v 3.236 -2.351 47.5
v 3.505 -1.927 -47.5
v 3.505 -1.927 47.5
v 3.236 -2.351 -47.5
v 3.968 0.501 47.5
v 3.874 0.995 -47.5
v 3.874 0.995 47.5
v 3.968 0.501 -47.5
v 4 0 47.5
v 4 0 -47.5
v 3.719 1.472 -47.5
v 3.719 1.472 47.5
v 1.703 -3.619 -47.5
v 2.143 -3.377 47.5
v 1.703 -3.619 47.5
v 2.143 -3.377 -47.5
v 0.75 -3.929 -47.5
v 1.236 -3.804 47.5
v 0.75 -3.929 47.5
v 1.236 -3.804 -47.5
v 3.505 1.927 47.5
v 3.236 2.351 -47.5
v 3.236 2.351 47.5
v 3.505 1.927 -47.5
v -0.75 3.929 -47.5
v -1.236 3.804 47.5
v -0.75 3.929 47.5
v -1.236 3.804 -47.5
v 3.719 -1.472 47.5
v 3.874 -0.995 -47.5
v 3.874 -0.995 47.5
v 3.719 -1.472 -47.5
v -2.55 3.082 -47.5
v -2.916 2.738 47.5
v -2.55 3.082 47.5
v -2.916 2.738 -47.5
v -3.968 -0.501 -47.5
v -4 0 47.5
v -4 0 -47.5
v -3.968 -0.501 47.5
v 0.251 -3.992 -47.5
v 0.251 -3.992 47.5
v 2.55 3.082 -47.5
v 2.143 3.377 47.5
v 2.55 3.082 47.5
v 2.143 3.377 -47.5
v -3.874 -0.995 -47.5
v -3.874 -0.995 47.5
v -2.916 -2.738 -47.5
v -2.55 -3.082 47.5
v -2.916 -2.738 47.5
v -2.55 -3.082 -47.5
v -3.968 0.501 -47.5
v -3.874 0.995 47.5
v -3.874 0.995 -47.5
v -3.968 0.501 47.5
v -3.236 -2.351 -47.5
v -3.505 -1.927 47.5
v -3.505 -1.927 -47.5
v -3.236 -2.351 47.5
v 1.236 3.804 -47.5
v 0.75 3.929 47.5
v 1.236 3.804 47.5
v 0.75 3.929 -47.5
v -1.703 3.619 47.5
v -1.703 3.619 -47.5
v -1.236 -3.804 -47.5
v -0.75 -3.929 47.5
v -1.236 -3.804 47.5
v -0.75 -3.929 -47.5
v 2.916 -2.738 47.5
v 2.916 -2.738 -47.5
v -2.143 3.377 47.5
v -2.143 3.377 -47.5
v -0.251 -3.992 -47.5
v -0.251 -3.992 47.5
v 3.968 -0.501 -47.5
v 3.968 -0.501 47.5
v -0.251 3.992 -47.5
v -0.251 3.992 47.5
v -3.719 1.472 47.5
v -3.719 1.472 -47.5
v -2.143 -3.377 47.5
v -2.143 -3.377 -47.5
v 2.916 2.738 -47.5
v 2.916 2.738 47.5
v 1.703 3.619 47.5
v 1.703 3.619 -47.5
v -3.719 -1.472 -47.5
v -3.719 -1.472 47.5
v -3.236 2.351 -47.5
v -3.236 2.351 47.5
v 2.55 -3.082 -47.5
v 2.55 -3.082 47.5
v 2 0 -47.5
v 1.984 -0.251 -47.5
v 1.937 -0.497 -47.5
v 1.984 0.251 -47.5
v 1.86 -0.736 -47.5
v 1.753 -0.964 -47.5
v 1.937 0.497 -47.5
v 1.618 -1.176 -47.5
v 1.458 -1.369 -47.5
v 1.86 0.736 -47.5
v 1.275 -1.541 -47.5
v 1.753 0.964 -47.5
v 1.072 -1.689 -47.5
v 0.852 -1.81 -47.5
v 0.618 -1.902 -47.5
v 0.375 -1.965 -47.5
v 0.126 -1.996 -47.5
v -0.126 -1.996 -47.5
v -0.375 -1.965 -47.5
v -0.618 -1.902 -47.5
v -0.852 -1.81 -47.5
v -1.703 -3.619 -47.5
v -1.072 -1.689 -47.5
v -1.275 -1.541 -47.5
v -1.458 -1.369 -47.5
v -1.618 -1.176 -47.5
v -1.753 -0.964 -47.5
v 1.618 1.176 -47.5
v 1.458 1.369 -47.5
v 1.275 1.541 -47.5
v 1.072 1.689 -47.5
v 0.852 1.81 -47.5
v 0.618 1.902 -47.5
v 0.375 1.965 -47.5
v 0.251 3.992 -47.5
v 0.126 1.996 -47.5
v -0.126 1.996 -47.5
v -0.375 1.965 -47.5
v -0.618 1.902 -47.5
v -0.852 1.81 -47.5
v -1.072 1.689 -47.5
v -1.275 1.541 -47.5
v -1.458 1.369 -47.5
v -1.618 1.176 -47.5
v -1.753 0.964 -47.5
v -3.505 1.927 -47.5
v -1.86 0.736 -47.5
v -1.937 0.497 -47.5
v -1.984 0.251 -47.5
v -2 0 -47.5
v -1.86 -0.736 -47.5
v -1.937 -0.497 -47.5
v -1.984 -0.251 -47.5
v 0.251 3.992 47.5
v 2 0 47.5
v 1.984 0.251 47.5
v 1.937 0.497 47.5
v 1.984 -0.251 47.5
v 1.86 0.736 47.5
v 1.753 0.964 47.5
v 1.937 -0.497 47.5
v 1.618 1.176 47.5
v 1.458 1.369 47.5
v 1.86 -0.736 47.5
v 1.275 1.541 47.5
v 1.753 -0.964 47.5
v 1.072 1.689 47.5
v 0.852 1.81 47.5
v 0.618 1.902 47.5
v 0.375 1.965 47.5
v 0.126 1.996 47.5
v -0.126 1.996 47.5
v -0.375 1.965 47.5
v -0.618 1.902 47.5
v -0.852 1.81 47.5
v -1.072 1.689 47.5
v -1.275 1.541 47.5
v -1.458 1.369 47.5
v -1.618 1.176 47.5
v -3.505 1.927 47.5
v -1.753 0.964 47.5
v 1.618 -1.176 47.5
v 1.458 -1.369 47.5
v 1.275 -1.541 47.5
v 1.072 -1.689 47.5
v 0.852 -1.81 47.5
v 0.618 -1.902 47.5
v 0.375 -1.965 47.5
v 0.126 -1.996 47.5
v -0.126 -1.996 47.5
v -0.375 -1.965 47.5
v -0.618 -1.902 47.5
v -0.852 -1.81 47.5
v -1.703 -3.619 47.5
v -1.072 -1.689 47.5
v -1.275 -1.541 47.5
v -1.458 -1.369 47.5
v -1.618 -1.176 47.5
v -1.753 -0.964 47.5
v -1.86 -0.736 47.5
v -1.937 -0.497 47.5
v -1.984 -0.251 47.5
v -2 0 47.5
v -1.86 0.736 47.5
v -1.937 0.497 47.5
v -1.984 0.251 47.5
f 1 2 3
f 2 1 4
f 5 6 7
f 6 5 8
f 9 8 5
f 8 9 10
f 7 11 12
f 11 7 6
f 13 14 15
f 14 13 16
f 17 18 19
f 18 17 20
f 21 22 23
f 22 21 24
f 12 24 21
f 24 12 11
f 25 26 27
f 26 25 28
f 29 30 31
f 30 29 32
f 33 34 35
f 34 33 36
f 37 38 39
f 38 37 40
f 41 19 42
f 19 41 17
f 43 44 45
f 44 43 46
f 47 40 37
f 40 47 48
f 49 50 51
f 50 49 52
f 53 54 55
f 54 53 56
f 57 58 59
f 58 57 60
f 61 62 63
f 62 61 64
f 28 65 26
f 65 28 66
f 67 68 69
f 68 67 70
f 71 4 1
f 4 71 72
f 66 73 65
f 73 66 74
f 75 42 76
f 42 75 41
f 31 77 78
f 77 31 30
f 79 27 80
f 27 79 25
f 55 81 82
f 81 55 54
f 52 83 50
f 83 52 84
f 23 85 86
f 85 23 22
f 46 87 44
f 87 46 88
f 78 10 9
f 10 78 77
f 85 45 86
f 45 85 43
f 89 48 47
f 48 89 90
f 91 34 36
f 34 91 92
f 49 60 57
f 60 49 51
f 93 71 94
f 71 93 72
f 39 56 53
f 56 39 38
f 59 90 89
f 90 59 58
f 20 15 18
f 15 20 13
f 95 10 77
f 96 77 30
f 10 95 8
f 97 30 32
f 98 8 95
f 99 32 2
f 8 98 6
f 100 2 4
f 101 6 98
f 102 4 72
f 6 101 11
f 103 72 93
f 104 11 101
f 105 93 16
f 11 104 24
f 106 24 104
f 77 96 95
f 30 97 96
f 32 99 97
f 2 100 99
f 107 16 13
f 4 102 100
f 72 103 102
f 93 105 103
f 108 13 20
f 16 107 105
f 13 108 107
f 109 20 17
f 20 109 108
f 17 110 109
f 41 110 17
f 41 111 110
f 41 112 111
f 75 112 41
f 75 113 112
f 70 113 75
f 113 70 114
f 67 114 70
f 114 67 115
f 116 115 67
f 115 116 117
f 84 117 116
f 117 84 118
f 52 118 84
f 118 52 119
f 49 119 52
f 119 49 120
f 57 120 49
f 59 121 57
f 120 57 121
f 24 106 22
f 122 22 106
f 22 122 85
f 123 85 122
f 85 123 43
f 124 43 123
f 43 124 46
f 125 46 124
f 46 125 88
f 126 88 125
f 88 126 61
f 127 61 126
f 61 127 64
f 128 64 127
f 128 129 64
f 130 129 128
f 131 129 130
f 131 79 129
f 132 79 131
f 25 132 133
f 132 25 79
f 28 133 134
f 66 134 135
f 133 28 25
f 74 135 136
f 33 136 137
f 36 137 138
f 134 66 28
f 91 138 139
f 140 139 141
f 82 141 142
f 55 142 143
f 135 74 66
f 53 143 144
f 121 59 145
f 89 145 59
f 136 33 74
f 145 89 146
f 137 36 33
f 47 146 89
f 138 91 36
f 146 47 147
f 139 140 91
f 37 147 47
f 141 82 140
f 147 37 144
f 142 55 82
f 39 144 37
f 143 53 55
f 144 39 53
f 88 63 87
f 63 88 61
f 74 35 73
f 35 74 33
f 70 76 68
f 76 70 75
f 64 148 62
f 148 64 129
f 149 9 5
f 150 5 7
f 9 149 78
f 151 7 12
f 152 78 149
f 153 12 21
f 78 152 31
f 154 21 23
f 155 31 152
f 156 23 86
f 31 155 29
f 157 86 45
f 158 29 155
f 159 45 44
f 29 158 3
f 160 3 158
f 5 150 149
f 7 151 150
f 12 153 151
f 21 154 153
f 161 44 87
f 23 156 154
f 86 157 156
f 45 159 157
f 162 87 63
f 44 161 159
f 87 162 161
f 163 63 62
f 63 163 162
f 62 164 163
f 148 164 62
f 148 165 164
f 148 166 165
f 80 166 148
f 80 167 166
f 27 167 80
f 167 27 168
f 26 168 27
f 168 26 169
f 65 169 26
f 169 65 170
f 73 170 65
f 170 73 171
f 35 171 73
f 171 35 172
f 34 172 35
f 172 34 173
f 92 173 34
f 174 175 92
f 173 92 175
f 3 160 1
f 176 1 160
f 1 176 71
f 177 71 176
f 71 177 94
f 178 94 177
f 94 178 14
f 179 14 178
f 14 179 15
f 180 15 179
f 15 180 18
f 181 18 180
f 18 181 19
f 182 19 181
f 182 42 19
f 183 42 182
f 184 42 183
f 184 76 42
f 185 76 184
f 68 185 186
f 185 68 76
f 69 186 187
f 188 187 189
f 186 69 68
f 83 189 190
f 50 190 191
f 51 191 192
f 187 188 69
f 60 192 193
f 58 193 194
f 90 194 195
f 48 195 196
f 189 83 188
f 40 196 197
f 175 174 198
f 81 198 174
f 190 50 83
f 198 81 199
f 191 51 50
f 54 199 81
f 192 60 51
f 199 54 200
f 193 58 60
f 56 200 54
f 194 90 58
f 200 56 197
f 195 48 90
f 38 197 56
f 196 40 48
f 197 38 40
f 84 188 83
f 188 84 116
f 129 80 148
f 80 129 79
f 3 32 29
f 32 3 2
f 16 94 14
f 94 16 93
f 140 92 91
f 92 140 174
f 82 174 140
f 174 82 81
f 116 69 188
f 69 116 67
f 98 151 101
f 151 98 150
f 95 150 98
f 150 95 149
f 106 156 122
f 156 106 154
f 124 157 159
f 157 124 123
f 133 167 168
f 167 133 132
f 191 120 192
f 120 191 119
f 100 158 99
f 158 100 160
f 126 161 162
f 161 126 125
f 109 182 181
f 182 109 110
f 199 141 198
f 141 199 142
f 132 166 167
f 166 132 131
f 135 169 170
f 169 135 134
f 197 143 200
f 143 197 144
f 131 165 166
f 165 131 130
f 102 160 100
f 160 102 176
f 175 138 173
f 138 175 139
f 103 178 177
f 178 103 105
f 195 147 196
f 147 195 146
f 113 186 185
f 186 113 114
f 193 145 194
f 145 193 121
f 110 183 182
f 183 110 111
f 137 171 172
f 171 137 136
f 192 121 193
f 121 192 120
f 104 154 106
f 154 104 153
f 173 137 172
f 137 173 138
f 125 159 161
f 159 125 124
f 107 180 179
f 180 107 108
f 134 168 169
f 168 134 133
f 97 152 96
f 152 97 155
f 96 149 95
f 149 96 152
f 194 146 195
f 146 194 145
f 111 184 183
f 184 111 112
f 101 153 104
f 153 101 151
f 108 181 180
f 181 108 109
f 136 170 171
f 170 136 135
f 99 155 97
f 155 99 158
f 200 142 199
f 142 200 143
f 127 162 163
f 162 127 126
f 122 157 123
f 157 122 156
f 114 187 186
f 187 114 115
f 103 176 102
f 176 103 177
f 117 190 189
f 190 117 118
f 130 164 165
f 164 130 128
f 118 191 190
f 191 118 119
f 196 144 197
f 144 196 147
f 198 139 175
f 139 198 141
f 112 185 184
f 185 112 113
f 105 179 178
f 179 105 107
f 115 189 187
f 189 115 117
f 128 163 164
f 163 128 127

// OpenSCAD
$fn = 50;


difference() {
	union() {
		translate(v = [0, 0, -47.5000000000]) {
			cylinder(h = 95, r = 4.0000000000);
		}
	}
	union() {
		translate(v = [0, 0, -100.0000000000]) {
			cylinder(h = 200, r = 2.0000000000);
		}
	}
}
